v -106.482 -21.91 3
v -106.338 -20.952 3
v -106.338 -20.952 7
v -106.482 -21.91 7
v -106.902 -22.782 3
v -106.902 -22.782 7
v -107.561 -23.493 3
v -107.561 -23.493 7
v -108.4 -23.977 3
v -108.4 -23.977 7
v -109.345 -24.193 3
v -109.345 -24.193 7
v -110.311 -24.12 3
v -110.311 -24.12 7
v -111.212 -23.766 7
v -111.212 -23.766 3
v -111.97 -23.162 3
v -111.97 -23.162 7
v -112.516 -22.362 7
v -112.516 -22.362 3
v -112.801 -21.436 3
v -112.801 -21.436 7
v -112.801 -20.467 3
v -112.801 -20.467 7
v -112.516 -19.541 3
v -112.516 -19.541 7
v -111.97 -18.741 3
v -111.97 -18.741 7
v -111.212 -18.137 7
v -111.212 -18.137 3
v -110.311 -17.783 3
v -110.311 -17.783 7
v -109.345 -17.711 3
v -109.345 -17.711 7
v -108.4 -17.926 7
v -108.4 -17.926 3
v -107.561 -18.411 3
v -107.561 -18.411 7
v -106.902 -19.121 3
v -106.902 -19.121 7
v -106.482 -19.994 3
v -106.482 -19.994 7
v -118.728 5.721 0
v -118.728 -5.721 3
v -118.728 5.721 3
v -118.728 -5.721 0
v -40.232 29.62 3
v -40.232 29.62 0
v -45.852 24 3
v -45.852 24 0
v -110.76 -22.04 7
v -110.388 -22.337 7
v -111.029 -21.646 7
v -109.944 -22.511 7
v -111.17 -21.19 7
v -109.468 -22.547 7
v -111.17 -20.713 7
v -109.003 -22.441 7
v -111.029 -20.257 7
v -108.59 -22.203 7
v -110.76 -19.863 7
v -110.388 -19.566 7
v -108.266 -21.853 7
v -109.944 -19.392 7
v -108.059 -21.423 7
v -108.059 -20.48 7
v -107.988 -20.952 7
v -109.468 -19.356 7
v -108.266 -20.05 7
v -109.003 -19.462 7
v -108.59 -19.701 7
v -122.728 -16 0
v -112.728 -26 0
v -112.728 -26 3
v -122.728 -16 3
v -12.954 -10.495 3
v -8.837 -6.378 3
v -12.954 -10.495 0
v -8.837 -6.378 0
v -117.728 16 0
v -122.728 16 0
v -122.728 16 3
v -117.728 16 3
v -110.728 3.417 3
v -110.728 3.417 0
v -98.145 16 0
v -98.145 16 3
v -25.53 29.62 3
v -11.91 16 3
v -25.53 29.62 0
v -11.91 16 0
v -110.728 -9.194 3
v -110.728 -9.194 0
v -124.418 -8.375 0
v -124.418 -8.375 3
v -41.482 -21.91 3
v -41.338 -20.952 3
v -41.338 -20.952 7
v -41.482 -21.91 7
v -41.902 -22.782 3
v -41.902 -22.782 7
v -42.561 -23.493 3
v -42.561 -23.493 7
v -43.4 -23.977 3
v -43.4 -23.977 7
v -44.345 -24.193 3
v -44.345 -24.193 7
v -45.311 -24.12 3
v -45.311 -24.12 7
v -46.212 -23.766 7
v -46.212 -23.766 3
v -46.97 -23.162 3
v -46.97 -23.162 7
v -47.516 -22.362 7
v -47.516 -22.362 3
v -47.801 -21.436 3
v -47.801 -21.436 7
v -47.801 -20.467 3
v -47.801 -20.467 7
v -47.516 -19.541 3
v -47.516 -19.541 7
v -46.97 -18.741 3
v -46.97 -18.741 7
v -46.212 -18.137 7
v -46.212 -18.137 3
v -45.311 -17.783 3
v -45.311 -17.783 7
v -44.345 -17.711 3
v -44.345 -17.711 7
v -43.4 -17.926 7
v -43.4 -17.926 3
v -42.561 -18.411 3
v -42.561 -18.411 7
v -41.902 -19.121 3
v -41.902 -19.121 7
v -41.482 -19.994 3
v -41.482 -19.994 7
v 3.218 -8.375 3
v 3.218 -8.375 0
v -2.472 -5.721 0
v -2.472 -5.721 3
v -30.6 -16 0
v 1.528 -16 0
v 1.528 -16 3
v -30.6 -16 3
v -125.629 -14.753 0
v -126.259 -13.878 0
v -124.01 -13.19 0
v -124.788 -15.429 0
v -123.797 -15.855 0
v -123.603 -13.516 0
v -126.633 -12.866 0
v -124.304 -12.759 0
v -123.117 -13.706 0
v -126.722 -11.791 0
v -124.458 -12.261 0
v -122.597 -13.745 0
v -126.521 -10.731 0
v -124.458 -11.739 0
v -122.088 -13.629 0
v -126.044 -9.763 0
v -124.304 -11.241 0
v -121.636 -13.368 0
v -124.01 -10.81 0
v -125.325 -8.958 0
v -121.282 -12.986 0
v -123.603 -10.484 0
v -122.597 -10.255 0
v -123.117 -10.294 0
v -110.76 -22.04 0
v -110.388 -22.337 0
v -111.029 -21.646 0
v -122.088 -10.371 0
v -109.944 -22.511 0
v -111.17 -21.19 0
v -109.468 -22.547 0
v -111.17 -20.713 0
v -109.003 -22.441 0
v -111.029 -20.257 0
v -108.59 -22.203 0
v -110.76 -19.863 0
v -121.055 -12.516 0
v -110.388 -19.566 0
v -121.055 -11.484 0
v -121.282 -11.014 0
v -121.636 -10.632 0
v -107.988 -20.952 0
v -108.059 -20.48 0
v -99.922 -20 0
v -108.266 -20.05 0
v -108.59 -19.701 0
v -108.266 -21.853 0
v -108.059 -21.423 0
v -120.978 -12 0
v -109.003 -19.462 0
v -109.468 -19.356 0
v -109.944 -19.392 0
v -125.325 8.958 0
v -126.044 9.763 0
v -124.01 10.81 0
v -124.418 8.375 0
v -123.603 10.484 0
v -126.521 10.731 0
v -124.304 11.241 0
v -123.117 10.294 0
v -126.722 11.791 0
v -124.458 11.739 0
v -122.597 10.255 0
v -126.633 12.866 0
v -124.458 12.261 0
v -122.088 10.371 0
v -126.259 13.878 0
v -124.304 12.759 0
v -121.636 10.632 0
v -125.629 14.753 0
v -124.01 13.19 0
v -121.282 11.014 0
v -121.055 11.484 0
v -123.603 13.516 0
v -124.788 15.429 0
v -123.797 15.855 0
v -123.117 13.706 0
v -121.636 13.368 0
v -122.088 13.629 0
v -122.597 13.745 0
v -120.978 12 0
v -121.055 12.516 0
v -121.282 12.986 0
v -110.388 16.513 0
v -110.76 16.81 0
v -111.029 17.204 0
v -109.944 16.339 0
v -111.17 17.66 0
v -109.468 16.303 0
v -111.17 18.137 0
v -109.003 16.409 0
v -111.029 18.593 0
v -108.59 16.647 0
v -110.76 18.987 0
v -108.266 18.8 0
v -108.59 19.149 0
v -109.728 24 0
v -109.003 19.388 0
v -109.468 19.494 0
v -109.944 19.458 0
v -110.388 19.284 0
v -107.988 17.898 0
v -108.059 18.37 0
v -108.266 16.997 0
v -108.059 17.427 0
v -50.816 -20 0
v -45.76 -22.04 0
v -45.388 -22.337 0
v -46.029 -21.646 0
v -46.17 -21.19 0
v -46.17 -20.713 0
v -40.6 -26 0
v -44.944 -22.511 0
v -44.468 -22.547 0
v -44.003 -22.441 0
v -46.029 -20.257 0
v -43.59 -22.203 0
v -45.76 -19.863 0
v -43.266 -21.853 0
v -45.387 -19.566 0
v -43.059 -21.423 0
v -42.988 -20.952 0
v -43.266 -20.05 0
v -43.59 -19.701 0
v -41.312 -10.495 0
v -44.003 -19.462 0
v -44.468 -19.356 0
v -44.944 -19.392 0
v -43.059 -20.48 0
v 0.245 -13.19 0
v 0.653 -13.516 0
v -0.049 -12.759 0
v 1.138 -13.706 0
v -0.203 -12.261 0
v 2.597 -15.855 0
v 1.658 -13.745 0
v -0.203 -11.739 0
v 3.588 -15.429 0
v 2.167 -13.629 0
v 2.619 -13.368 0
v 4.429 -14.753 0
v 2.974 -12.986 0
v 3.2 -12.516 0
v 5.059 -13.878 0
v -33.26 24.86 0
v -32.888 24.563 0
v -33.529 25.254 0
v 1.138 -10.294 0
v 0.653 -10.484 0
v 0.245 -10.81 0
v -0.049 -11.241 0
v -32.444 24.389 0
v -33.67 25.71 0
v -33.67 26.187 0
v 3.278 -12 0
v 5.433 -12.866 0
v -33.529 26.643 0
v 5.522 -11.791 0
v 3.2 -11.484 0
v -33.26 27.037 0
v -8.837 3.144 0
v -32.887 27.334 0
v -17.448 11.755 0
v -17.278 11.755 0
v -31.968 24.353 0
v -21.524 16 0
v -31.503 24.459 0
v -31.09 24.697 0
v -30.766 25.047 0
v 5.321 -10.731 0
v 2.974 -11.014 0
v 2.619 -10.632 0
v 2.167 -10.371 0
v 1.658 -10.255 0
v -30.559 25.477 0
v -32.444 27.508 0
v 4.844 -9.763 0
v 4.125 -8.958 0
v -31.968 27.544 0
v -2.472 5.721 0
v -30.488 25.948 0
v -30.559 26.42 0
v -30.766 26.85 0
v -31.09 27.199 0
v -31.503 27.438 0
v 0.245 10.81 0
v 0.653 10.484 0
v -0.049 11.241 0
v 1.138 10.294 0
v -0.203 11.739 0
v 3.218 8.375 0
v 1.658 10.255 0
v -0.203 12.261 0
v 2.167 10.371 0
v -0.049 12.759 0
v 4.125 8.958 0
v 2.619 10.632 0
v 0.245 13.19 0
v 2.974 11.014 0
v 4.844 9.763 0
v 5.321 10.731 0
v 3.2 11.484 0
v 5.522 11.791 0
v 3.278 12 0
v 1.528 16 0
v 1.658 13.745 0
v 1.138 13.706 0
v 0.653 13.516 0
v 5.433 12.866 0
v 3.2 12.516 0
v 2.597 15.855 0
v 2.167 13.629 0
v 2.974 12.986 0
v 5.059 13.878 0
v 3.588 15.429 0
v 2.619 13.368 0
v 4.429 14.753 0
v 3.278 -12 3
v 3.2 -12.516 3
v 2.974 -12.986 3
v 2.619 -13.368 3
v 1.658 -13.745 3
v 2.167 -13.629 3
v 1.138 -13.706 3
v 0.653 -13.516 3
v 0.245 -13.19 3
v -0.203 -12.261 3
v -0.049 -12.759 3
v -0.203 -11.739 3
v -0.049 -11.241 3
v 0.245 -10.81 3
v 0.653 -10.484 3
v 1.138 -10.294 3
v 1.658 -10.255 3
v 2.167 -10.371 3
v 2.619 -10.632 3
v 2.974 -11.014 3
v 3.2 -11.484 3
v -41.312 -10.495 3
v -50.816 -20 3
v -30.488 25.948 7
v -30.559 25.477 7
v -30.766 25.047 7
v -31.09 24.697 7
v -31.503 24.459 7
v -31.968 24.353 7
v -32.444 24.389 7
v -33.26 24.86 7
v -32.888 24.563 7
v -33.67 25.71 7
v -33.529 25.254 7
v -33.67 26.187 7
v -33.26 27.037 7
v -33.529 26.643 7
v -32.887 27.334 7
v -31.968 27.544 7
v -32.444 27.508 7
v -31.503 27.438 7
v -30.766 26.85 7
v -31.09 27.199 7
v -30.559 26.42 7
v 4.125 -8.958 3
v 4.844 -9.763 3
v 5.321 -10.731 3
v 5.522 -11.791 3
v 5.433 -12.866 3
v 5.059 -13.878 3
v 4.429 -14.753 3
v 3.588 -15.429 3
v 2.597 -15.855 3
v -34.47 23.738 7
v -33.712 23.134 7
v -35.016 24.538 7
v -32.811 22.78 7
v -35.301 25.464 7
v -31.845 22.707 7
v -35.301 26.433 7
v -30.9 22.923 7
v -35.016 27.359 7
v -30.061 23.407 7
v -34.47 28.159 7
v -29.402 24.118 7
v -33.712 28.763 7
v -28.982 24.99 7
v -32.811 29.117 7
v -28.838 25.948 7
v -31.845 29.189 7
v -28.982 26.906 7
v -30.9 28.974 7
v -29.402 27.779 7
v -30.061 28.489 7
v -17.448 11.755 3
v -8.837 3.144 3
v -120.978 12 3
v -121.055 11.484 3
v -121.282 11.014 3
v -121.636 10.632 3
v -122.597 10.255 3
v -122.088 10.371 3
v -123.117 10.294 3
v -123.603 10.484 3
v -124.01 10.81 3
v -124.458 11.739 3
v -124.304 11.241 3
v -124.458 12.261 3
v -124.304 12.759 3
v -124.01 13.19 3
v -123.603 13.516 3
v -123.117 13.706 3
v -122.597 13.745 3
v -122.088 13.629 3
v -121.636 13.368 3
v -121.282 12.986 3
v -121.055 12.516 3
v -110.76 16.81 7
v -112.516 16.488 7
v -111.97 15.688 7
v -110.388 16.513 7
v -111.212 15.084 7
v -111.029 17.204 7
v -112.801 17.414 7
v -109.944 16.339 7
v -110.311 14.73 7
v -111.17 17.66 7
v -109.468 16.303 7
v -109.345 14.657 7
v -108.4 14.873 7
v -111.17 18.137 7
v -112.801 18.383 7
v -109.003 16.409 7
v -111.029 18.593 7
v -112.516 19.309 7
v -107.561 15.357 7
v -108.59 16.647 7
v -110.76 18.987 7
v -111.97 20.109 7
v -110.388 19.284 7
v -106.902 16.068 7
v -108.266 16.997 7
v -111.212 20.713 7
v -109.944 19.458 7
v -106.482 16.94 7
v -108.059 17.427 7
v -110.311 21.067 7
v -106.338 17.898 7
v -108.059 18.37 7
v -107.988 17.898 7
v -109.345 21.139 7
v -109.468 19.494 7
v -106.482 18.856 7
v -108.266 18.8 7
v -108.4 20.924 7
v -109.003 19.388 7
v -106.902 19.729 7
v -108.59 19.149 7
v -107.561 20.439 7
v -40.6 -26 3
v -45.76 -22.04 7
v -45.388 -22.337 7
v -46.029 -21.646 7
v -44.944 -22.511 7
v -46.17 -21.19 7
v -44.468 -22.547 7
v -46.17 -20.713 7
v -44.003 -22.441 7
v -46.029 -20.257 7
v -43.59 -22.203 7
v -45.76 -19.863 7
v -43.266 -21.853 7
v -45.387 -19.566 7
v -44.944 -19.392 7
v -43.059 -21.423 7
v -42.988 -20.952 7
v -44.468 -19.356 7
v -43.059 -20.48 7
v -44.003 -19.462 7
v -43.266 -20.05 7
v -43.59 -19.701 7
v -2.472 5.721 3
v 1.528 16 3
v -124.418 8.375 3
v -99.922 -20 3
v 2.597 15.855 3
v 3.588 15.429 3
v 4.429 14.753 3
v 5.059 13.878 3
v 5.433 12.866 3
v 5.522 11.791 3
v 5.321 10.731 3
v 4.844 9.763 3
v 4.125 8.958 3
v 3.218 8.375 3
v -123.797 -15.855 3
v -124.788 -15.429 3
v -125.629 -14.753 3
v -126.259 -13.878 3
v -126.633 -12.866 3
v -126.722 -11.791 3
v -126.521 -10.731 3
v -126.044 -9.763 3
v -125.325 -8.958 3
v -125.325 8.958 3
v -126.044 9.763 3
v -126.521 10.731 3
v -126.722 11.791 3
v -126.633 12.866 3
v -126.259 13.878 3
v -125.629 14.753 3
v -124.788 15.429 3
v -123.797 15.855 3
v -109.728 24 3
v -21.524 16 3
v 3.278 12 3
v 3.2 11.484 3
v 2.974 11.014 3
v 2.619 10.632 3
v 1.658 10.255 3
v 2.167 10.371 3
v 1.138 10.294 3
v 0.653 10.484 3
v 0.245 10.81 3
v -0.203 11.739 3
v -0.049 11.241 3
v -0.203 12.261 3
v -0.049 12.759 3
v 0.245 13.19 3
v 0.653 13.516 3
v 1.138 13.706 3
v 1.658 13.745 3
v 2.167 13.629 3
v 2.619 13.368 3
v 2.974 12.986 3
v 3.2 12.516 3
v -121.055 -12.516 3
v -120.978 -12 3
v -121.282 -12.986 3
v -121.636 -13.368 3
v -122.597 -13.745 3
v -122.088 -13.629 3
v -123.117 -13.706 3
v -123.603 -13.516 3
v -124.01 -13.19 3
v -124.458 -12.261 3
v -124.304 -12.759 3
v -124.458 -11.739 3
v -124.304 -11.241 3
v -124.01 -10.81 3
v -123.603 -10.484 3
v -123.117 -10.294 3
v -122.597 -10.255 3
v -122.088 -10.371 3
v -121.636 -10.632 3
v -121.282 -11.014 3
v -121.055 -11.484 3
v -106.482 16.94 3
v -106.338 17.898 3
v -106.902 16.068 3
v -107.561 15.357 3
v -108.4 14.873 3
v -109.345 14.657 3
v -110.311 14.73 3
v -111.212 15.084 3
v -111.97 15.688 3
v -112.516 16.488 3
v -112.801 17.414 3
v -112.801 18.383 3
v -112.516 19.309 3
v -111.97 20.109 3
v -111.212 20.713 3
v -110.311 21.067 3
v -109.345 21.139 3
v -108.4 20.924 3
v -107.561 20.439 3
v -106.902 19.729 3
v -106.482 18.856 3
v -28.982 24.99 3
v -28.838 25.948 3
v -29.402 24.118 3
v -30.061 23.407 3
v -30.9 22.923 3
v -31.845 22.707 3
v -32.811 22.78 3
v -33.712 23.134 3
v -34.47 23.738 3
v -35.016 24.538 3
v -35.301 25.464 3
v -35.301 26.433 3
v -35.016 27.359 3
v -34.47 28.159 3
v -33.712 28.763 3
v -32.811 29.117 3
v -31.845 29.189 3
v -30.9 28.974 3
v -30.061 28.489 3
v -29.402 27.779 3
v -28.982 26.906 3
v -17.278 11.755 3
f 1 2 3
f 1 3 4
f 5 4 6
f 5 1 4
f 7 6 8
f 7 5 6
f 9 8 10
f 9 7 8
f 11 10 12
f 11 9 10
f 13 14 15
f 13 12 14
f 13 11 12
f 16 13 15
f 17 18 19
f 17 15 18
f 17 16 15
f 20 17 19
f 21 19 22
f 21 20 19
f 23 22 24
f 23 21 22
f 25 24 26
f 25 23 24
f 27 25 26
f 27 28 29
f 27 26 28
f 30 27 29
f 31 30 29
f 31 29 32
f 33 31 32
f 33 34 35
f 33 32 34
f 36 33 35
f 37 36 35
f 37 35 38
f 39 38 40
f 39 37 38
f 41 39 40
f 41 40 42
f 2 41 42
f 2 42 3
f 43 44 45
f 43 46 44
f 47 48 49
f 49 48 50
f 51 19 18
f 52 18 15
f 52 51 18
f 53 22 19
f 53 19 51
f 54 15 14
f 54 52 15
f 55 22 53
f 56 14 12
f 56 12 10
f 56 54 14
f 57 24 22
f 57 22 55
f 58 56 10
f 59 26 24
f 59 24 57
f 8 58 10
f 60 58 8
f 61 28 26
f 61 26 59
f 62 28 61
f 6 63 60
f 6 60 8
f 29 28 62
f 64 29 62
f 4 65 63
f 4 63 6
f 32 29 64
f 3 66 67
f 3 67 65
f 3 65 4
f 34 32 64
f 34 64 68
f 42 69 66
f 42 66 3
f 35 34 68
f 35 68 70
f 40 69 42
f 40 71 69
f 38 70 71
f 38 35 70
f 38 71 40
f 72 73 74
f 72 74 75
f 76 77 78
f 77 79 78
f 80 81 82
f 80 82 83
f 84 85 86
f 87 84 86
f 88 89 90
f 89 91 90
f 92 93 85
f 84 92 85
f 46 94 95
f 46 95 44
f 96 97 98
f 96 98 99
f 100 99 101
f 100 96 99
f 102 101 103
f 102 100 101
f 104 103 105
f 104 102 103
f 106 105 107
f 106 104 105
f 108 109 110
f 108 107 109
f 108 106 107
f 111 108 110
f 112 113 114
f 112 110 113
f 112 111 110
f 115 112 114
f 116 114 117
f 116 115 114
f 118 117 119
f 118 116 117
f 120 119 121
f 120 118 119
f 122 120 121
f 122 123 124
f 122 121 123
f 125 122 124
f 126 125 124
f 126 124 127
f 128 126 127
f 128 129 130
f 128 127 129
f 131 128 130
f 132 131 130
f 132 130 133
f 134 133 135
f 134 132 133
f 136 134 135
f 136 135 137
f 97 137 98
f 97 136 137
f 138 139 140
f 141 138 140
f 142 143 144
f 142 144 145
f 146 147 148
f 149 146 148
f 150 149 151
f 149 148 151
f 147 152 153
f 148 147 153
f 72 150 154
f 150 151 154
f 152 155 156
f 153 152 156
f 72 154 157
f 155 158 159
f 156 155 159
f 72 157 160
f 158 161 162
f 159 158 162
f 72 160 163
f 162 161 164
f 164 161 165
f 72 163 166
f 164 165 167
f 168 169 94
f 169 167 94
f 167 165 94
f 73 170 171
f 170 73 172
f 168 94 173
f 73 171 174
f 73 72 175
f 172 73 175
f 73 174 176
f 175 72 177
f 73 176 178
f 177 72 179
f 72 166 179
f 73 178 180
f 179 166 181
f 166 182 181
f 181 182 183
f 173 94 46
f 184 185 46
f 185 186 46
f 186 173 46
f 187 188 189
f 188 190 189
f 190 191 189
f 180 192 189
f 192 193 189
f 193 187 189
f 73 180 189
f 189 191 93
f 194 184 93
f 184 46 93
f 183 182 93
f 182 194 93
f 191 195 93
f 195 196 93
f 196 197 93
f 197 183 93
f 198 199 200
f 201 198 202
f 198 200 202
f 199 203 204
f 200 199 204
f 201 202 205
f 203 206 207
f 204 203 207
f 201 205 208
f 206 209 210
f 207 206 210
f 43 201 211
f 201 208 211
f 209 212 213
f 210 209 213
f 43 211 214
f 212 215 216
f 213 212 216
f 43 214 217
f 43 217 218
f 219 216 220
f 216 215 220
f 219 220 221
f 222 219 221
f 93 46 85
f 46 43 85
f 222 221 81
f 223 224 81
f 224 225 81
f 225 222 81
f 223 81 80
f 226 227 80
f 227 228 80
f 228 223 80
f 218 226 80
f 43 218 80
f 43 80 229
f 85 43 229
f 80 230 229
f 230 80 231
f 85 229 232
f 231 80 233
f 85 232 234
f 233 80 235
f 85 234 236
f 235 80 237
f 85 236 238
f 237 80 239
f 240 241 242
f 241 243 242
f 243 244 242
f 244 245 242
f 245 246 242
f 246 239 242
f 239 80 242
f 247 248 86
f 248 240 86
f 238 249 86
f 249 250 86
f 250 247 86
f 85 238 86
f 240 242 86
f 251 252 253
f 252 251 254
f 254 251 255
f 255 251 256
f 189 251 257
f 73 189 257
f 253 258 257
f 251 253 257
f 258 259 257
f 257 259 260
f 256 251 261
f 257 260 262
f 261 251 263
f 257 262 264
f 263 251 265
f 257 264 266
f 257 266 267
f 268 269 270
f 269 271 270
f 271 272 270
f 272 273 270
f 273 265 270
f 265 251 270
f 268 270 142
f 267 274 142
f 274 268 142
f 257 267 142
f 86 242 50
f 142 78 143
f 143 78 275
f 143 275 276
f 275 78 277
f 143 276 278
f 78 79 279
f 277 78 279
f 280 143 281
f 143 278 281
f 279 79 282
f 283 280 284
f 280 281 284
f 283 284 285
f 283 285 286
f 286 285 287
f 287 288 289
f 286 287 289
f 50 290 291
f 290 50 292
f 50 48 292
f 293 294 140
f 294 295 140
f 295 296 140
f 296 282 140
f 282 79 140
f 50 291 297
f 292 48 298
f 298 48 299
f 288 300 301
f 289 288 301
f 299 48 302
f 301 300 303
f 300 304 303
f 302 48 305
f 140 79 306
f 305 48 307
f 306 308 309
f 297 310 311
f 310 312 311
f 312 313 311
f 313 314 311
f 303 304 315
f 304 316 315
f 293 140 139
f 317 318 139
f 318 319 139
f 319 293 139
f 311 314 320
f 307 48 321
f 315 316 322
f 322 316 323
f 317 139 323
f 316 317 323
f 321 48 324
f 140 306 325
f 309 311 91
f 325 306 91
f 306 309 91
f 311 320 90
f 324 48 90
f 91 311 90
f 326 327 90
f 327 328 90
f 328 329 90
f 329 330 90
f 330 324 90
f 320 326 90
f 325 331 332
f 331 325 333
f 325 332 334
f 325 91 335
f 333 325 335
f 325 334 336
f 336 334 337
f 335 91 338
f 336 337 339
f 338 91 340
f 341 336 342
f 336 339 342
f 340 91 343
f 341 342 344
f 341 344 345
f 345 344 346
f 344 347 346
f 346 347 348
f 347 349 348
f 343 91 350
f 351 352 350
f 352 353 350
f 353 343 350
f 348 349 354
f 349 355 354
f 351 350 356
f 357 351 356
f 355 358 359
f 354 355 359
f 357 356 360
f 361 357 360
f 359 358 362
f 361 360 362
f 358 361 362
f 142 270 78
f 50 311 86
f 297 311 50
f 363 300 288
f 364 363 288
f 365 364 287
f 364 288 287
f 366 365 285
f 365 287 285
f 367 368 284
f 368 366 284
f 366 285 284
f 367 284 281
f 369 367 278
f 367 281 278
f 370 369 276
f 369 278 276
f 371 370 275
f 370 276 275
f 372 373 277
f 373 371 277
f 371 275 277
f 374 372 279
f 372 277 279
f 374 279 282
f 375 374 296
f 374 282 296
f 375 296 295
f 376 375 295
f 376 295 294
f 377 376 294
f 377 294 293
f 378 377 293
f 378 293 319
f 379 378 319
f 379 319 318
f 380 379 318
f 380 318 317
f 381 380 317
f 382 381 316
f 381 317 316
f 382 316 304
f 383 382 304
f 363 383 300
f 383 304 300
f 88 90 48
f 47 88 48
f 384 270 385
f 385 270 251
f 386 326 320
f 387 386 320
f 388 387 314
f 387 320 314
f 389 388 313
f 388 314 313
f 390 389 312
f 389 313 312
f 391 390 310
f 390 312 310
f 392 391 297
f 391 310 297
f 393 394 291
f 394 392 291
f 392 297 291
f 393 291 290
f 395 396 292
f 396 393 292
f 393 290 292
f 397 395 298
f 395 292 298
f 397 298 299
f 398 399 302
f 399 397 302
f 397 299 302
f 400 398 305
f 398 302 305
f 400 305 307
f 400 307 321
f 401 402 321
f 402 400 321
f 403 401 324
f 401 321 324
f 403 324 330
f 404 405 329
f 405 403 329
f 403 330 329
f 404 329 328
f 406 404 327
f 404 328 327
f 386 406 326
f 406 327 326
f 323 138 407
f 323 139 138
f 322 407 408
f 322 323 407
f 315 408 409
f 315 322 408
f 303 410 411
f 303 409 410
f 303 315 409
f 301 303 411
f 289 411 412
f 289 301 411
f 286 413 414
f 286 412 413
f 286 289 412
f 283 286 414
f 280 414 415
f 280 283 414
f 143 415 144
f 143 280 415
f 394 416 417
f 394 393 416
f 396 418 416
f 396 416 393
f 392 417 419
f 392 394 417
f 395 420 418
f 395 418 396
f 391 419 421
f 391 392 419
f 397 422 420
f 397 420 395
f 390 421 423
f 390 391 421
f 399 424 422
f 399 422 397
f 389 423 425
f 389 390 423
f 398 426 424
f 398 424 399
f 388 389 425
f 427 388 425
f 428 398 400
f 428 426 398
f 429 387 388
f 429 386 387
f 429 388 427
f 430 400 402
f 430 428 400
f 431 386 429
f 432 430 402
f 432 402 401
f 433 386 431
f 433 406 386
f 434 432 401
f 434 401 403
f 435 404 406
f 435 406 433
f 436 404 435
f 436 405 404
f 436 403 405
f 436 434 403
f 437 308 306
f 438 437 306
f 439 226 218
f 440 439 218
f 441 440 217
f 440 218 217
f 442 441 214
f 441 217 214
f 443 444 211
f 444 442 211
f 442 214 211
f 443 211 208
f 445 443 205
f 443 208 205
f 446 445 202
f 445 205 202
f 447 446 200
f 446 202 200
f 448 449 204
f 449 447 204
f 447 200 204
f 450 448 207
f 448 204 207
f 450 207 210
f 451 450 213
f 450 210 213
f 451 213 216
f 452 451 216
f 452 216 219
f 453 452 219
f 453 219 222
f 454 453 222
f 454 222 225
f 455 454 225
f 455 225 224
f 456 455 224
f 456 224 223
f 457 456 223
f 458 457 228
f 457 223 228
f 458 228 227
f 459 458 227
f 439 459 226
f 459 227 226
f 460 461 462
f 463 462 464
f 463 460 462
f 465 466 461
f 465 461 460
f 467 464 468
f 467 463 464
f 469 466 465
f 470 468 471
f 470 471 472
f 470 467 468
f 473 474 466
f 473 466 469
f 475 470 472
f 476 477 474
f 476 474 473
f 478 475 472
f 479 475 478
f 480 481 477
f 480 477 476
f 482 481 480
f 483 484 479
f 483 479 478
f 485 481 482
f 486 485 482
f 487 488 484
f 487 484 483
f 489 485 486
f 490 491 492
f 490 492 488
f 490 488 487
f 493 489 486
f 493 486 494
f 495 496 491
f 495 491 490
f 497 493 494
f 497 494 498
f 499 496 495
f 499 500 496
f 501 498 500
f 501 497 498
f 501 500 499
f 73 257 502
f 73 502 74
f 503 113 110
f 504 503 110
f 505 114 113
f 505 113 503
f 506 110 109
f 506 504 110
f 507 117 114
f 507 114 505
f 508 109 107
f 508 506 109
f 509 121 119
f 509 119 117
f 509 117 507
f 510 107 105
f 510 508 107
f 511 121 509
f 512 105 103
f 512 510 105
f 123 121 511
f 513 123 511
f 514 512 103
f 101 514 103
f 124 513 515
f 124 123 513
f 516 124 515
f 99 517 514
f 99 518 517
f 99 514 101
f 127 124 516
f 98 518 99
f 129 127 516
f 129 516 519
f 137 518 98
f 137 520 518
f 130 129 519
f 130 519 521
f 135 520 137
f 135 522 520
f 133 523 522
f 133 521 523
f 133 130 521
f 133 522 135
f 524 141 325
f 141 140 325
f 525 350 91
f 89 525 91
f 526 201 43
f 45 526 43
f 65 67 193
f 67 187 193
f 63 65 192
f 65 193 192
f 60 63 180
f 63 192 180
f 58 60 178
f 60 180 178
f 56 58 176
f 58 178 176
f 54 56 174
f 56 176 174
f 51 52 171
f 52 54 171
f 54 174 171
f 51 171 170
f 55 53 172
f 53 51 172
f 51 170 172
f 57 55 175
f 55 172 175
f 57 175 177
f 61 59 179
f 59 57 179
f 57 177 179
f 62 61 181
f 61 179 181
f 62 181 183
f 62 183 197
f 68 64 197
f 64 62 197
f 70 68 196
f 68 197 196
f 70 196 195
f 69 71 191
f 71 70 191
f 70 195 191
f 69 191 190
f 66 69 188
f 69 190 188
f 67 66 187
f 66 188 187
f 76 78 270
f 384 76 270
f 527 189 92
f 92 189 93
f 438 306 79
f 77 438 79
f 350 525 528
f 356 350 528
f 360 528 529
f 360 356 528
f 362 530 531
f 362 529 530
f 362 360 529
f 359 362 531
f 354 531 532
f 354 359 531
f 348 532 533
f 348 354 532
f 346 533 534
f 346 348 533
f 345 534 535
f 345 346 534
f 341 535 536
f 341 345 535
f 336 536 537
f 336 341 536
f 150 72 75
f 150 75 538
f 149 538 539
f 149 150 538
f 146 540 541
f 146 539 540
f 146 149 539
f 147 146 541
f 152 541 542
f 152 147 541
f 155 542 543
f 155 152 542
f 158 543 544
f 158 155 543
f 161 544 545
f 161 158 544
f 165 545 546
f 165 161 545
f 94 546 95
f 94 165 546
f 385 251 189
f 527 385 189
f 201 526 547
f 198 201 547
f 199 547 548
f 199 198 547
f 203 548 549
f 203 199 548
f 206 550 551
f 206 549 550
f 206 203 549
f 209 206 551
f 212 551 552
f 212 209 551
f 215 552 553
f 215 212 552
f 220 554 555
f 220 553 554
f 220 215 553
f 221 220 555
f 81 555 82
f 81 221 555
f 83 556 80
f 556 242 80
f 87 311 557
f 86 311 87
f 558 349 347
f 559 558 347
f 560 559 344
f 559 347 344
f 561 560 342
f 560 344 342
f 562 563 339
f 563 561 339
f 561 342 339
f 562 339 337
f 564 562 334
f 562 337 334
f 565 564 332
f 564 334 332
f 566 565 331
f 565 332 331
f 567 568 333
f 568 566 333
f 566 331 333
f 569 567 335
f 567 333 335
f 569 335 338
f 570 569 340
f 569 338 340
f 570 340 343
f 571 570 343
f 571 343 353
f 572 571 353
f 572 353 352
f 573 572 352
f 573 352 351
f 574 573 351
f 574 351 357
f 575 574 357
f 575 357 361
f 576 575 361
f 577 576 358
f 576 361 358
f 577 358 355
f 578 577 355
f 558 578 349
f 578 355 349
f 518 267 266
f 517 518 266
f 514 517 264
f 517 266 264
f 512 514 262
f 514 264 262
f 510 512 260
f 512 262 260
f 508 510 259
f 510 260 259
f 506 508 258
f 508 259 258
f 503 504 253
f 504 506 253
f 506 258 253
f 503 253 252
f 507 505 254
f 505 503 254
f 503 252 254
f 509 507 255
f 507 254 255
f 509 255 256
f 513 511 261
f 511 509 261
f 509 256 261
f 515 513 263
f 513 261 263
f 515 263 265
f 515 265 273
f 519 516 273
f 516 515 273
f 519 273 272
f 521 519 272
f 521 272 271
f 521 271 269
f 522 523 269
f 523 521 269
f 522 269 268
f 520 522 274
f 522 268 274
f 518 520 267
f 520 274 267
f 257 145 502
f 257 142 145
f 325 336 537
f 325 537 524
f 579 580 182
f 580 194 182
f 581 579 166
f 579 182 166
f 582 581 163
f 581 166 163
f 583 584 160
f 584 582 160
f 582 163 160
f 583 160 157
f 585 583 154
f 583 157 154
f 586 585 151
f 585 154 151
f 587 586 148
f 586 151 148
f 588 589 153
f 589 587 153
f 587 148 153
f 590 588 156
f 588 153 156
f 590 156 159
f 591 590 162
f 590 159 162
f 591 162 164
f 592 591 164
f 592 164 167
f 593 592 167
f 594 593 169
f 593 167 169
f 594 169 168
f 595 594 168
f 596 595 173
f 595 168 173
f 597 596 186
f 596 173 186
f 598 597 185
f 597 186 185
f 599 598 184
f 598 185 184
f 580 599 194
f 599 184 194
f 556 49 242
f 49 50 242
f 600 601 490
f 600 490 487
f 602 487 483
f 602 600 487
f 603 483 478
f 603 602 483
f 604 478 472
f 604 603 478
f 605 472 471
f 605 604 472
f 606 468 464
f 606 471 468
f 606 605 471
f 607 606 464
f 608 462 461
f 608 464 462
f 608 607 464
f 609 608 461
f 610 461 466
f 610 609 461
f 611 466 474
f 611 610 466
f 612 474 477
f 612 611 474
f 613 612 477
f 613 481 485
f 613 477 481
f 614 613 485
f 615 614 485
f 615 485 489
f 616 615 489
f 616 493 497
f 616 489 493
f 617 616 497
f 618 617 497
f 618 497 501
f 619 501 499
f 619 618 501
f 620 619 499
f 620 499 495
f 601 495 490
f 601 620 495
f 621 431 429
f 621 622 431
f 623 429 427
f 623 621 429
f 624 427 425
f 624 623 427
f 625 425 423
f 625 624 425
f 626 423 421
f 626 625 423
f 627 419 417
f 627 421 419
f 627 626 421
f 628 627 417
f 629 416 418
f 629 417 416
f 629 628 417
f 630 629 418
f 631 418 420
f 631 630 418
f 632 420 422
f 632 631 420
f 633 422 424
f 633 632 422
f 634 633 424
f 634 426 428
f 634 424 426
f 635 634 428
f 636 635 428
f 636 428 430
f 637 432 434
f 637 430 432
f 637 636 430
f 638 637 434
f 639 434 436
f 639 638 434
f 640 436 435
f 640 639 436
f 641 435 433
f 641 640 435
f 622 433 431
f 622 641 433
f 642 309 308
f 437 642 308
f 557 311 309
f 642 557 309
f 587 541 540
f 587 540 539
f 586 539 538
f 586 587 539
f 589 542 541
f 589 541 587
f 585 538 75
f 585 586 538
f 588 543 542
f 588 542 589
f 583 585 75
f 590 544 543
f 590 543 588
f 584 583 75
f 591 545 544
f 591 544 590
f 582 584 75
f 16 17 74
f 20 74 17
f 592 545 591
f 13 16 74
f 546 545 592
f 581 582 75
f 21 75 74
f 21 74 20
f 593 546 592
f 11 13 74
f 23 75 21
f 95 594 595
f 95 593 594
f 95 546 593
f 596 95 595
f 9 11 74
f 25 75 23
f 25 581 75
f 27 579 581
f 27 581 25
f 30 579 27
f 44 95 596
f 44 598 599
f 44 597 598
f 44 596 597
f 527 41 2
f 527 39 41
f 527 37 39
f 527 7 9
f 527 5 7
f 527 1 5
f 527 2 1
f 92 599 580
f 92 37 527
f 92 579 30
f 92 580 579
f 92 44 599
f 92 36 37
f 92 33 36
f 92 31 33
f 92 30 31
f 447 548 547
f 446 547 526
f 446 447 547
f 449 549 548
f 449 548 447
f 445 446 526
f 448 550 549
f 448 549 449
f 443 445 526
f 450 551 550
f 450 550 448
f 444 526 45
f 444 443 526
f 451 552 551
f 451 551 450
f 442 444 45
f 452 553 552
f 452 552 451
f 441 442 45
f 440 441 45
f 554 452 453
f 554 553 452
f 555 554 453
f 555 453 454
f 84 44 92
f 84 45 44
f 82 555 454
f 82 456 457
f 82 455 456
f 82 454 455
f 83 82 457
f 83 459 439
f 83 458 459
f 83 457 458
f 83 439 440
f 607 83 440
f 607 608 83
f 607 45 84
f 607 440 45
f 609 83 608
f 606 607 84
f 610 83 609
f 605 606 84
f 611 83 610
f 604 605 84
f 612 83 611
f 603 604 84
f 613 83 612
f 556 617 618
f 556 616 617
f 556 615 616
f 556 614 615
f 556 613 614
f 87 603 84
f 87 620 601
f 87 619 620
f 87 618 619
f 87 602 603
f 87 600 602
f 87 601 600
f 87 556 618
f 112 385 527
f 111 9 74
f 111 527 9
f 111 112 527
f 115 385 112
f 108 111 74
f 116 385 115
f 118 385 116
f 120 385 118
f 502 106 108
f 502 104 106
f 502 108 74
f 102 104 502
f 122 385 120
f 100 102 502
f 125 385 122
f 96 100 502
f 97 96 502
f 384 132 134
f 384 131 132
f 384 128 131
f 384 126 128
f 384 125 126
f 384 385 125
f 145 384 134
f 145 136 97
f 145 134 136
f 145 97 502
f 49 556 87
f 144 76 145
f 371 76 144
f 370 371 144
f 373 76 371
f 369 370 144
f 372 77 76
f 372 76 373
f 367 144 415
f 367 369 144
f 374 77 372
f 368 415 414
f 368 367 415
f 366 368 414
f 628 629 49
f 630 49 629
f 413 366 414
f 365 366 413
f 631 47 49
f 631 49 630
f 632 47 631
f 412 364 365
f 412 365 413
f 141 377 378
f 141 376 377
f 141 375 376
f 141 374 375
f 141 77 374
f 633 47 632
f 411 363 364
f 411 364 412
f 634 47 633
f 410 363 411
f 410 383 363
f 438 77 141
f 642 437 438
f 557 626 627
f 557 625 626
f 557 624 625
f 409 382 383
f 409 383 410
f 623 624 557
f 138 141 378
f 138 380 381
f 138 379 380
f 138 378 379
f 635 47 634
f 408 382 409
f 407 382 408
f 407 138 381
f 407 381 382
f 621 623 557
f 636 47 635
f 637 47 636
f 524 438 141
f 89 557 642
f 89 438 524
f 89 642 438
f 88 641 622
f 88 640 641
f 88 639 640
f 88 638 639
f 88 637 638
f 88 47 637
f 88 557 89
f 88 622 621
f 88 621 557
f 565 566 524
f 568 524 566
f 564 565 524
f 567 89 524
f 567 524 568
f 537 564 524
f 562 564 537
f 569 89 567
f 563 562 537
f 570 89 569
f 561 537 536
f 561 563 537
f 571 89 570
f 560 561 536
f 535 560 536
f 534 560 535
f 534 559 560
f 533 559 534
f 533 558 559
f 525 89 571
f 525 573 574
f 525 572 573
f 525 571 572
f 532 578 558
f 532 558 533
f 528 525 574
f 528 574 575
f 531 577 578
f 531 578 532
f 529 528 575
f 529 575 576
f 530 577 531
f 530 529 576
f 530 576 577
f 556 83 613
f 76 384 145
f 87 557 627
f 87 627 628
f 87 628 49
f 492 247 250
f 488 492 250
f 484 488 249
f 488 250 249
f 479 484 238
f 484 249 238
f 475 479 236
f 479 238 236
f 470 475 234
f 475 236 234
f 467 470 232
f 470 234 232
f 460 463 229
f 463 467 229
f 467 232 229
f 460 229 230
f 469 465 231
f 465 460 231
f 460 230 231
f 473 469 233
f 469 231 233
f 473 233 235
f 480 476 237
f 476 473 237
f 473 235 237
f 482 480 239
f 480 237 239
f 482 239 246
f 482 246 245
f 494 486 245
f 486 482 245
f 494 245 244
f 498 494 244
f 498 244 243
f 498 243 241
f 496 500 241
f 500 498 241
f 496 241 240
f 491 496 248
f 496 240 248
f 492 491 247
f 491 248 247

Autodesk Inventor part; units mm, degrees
ref_plane "YZ Plane" through (0, 0, 0) normal (1, 0, 0) x (0, 1, 0)
ref_plane "XZ Plane" through (0, 0, 0) normal (0, 1, 0) x (-1, 0, 0)
ref_plane "XY Plane" through (0, 0, 0) normal (0, 0, 1) x (1, 0, 0)
sketch "Sketch1" plane through (0, 0, 0) normal (0, 0, 1) x (1, 0, 0)
  circle A0 centre (1.5276, -12) radius 1.75
  circle A1 centre (1.5276, 0) radius 1.75
  circle A2 centre (1.5276, 12) radius 1.75
  arc A3 (1.5276, -16) -> (3.2181, -8.3748) centre (1.5276, -12) ccw
  line L0 (3.2181, -8.3748) -> (-2.4724, -5.7213)
  line L1 (1.5276, -16) -> (-60.6, -16)
  line L2 (11.3984, 0) -> (-64.1078, 0)
  line L3 (-60.6, 141.7) -> (-60.6, -41.7)
  line L4 (-2.4724, -5.7213) -> (-2.4724, 0)
  arc A4 (3.2181, 8.3748) -> (1.5276, 16) centre (1.5276, 12) ccw
  line L5 (3.2181, 8.3748) -> (-2.4724, 5.7213)
  line L6 (1.5276, 16) -> (-60.6, 16) construction
  line L7 (-2.4724, 5.7213) -> (-2.4724, 0)
  circle A5 centre (-32.0875, 25.9484) radius 1.6
  circle A6 centre (-44.5875, -20.9516) radius 1.6
  circle A7 centre (-109.5875, -20.9516) radius 1.6
  circle A8 centre (-109.5875, 17.8984) radius 1.6
  line L8 (-30.6, -16) -> (-40.6, -26)
  line L9 (-30.6, -16) -> (-16.4579, -16) construction
  line L10 (-40.6, -26) -> (-60.6, -26)
  line L11 (1.5276, 16) -> (-23.224, 16)
  line L12 (-23.224, 16) -> (-31.224, 24) construction
  line L13 (-23.224, 16) -> (-11.9103, 16) construction
  line L14 (-31.224, 24) -> (-109.7276, 24)
  line L15 (-109.7276, 24) -> (-117.7276, 16)
  circle A9 centre (-122.7276, -12) radius 1.75
  circle A10 centre (-122.7276, 0) radius 1.75
  circle A11 centre (-122.7276, 12) radius 1.75
  arc A12 (-124.4181, -8.3748) -> (-122.7276, -16) centre (-122.7276, -12) ccw
  arc A13 (-122.7276, 16) -> (-124.4181, 8.3748) centre (-122.7276, 12) ccw
  line L16 (-122.7276, 16) -> (-117.7276, 16)
  line L17 (-60.6, -26) -> (-112.7276, -26)
  line L18 (-112.7276, -26) -> (-122.7276, -16)
  line L19 (-124.4181, -8.3748) -> (-118.7276, -5.7213)
  line L20 (-118.7276, -5.7213) -> (-118.7276, 0)
  line L21 (-118.7276, 5.7213) -> (-118.7276, 0)
  line L22 (-124.4181, 8.3748) -> (-118.7276, 5.7213)
  line L23 (-11.9103, 16) -> (-25.5298, 29.6196)
  line L24 (-11.9103, 16) -> (7.3507, 16) construction
  line L25 (-25.5298, 29.6196) -> (-40.2322, 29.6196)
  line L26 (-40.2322, 29.6196) -> (-45.8517, 24)
  line L27 (-12.954, -10.4954) -> (-41.3116, -10.4954)
  line L28 (-41.3116, -10.4954) -> (-50.8162, -20)
  line L29 (-50.8162, -20) -> (-99.9221, -20)
  line L30 (-99.9221, -20) -> (-110.7276, -9.1945)
  line L31 (-110.7276, -9.1945) -> (-110.7276, 3.4171)
  line L32 (-110.7276, 3.4171) -> (-98.1447, 16)
  line L33 (-98.1447, 16) -> (-21.5239, 16)
  line L34 (-21.5239, 16) -> (-17.2785, 11.7546)
  line L35 (-17.2785, 11.7546) -> (-17.448, 11.7546)
  line L36 (-17.448, 11.7546) -> (-8.8369, 3.1435)
  line L37 (-8.8369, 3.1435) -> (-8.8369, -6.3783)
  line L38 (-8.8369, -6.3783) -> (-12.954, -10.4954)
  point P0 (0, 0)
extrude "Extrusion1" add sketch "Sketch1" along normal blind 3 contours L4 L0 A3 L1 L28 L27 L38 L37 L2 | L2 L37 L36 L35 L34 L11 A4 L5 L7 | L33 L32 L31 L30 L29 L3 L17 L18 A12 L19 L20 L21 L22 A13 L16 L15 L14 | L3 L14 L26 L25 L23 L11 L33 | L1 L8 L10 L3 L29 L28
sketch "Sketch2" plane through (0, 0, 3) normal (0, 0, 1) x (1, 0, 0)
  circle A0 centre (-32.0875, 25.9484) radius 1.6 projected
  circle A1 centre (-44.5875, -20.9516) radius 1.6 projected
  circle A2 centre (-109.5875, -20.9516) radius 1.6 projected
  circle A3 centre (-109.5875, 17.8984) radius 1.6 projected
  circle A4 centre (-109.5875, -20.9516) radius 3.25
  circle A5 centre (-109.5875, 17.8984) radius 3.25
  circle A6 centre (-32.0875, 25.9484) radius 3.25
  circle A7 centre (-44.5875, -20.9516) radius 1.6 projected
  circle A8 centre (-44.5875, -20.9516) radius 3.25
  point P0 (0, 0)
  dimension "d15" = 6.5
  dimension "d16" = 6.5
  dimension "d17" = 6.5
  dimension "d18" = 6.5
extrude "Extrusion2" add sketch "Sketch2" along normal blind 4
properties part number "Motordriver_Adapter"
